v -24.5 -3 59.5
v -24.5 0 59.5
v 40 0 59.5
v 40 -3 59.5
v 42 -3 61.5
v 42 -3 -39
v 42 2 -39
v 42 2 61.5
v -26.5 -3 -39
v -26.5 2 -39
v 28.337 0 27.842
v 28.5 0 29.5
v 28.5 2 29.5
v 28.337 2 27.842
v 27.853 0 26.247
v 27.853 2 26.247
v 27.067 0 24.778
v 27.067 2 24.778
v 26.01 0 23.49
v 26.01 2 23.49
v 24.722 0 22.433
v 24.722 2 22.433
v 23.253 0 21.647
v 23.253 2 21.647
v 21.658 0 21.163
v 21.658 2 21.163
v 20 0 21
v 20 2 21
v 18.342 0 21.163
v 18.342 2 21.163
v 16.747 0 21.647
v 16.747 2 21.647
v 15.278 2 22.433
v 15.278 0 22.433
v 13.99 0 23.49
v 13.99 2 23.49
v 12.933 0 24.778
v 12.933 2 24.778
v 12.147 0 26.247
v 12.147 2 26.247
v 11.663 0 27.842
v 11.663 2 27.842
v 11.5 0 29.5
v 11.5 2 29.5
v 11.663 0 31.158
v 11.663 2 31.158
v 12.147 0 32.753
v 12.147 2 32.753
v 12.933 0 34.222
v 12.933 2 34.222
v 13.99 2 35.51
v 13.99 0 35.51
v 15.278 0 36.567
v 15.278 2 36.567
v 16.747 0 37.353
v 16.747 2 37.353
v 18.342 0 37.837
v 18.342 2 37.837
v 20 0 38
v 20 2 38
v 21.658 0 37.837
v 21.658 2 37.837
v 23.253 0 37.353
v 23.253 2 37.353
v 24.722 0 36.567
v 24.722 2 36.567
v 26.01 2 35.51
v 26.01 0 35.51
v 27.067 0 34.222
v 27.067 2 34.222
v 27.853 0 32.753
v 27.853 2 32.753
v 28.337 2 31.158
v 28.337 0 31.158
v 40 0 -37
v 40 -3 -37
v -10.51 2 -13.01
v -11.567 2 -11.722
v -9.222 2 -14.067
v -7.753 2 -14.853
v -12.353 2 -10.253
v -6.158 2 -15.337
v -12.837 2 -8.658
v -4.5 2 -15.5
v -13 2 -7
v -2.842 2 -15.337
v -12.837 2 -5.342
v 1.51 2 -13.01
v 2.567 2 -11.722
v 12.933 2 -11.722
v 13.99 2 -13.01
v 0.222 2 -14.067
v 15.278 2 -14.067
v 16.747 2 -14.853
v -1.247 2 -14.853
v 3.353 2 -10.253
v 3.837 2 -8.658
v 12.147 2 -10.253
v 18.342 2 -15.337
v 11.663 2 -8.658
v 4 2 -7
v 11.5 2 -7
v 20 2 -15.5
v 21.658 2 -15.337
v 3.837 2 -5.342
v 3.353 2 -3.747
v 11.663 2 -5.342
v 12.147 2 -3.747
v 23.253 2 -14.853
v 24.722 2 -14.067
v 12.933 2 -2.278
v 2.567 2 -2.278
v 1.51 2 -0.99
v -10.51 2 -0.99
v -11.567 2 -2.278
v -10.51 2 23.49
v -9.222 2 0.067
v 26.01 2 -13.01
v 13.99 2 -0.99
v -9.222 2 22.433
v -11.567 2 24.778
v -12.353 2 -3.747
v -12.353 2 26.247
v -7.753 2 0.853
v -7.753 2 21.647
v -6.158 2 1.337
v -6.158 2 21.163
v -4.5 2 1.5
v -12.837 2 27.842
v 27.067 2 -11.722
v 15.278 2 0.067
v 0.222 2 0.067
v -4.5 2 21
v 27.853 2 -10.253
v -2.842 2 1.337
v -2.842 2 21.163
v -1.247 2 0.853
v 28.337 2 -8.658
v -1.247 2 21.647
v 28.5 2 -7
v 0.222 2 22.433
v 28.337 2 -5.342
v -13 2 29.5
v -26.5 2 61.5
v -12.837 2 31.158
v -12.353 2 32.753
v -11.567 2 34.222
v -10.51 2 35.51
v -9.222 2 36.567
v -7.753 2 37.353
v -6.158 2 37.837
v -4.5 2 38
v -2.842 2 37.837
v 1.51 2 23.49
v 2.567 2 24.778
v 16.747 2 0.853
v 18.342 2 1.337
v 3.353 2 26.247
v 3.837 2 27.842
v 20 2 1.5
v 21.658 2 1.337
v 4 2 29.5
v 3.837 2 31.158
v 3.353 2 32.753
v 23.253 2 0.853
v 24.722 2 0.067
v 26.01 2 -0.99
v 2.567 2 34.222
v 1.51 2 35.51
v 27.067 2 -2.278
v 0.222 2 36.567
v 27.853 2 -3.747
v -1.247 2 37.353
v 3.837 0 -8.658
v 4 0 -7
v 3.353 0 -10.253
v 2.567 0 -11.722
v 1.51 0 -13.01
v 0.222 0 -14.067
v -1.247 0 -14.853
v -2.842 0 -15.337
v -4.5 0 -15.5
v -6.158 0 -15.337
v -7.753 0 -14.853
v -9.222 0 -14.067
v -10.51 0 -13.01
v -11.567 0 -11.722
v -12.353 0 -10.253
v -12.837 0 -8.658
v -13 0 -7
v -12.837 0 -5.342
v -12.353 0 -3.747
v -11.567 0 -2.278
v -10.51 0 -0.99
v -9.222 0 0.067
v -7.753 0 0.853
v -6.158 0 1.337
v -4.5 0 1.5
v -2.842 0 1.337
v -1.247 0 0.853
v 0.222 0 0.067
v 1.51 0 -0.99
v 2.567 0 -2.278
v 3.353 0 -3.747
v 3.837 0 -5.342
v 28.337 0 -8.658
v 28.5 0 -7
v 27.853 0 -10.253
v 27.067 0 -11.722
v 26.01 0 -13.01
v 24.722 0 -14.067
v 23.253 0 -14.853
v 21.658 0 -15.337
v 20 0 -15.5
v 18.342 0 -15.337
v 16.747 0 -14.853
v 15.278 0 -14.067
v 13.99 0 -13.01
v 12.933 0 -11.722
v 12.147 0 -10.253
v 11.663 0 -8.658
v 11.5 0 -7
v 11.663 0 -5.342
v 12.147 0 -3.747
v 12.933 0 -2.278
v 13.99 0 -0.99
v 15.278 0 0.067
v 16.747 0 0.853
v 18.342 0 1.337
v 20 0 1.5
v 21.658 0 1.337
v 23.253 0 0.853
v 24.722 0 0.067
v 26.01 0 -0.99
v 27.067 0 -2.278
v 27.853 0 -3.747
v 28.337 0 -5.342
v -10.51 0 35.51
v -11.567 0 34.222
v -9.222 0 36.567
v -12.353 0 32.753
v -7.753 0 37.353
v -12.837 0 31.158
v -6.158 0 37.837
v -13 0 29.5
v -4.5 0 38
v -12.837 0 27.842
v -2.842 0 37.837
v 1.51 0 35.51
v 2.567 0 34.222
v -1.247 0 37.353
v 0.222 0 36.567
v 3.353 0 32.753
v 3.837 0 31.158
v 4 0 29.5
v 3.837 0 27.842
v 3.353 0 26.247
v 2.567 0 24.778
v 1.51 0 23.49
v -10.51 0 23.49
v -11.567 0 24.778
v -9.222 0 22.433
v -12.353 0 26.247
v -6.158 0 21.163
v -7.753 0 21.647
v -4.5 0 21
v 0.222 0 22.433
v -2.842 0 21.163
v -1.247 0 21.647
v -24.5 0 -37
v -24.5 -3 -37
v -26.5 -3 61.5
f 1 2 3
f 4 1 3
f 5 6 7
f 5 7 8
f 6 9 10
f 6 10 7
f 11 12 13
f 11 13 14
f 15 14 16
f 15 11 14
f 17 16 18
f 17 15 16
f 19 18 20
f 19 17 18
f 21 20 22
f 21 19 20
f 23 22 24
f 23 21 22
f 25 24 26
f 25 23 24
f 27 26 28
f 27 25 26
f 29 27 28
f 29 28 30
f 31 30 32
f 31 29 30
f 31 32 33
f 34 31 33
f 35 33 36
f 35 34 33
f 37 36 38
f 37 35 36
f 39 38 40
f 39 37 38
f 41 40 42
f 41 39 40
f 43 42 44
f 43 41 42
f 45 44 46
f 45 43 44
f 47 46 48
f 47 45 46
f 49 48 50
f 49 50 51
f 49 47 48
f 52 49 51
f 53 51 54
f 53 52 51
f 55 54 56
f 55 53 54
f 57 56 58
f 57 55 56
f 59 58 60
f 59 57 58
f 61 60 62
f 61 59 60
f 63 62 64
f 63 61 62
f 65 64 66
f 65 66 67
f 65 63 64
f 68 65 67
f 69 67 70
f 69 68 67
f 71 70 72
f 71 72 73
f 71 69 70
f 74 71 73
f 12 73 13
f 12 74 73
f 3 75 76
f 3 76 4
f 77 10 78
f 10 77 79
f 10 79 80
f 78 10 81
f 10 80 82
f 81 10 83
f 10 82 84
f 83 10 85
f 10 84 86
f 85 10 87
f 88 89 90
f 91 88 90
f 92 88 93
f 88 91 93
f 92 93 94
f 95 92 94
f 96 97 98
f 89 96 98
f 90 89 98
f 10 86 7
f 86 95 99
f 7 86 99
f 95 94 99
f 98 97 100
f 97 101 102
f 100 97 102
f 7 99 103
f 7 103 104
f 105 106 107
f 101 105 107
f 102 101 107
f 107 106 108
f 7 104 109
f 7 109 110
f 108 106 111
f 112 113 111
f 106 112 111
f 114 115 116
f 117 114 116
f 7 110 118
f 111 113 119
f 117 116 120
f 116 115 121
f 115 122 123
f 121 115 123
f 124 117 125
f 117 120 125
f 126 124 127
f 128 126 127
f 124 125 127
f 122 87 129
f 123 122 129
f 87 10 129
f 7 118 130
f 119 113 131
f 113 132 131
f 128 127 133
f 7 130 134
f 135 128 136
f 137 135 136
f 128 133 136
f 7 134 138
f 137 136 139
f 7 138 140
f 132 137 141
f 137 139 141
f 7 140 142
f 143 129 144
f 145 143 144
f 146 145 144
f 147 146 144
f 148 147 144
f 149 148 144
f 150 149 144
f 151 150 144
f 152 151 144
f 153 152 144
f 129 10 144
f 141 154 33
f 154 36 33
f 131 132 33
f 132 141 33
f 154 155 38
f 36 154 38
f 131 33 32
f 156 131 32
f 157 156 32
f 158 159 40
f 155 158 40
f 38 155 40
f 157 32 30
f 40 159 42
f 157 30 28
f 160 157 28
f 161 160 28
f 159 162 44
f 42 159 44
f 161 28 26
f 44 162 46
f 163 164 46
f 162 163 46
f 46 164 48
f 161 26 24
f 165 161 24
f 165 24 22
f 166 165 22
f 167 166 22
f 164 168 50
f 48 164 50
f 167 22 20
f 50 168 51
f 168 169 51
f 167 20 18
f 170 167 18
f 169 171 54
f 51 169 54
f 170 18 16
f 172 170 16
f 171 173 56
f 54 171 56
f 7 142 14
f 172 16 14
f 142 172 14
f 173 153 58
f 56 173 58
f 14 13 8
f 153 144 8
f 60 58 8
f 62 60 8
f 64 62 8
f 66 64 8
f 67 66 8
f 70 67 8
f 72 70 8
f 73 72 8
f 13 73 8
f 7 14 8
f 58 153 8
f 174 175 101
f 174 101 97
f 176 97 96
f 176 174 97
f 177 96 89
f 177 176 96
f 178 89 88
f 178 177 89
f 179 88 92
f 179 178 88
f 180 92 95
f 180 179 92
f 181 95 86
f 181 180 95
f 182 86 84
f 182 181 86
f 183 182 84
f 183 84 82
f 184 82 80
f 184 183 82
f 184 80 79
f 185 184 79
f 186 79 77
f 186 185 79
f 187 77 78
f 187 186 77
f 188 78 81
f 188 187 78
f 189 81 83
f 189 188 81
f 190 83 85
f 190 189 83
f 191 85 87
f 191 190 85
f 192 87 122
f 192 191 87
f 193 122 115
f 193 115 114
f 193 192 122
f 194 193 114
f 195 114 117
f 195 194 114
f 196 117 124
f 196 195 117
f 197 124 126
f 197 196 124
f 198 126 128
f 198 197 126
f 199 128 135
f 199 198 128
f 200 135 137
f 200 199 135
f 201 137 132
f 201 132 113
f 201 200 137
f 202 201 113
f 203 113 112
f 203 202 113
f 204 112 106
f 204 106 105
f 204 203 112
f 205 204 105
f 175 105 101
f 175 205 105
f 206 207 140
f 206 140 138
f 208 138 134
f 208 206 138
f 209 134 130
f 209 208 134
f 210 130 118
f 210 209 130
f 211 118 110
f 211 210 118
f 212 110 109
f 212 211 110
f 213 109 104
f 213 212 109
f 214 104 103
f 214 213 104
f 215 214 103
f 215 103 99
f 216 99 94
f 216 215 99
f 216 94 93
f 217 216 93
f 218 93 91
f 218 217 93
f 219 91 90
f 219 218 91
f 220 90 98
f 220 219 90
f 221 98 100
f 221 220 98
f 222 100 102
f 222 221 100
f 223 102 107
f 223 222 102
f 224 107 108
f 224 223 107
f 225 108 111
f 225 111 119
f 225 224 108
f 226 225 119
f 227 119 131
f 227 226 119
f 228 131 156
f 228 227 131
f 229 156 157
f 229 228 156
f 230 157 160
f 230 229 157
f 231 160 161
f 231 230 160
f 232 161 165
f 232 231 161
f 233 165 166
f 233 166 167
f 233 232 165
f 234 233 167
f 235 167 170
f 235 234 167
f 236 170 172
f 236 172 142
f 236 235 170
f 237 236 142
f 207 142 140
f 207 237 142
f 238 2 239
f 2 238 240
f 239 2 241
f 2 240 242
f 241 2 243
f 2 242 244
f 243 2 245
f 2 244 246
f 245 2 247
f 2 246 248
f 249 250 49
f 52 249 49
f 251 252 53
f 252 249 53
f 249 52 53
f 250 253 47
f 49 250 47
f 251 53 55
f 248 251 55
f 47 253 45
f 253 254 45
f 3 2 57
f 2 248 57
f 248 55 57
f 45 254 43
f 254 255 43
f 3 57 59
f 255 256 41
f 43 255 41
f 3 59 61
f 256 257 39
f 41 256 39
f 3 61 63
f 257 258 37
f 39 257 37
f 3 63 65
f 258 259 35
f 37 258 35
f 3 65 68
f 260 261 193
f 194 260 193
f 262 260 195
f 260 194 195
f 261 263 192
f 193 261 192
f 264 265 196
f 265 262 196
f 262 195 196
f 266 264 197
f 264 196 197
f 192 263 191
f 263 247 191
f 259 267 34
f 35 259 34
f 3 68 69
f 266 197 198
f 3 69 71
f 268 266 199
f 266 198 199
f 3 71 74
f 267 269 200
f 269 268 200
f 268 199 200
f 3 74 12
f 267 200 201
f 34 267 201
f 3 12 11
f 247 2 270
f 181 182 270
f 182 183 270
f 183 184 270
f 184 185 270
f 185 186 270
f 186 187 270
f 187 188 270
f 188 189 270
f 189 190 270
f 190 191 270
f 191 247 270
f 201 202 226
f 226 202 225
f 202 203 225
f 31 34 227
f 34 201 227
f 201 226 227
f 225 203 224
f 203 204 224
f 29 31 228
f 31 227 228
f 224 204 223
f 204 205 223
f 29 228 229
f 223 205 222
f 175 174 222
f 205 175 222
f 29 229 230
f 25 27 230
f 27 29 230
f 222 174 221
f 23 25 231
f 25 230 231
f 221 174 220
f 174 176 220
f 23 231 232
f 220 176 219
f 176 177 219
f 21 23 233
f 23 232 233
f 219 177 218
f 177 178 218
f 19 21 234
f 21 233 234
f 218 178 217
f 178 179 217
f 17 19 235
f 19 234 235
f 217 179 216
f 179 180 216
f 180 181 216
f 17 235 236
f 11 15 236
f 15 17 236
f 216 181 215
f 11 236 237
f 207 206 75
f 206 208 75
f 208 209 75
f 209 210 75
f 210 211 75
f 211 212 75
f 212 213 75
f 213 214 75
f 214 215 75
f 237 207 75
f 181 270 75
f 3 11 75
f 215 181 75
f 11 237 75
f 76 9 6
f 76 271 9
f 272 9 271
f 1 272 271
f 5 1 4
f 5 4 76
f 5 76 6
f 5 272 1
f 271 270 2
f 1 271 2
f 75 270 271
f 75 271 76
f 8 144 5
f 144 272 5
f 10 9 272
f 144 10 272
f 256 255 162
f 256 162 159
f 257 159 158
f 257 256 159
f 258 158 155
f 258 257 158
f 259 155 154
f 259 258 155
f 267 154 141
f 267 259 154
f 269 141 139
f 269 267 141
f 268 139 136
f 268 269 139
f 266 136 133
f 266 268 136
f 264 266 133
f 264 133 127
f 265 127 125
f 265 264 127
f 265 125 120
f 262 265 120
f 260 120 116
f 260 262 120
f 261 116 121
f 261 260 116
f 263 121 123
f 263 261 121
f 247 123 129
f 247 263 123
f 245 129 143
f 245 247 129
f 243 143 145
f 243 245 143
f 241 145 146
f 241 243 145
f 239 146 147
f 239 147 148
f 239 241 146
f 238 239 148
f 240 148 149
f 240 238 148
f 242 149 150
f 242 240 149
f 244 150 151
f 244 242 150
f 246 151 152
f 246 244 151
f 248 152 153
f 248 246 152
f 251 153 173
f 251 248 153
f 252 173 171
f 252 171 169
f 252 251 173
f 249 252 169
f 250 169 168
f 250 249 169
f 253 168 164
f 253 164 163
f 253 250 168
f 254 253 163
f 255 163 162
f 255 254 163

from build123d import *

# Parameters (mm, degrees)
CROQUIS1_W                   = 64.5
CROQUIS1_H                   = 96.5
CROQUIS1_R                   = 8.5
SALIENTE_EXTRUIR4_DEPTH      = 2
CROQUIS2_W                   = 68.5
CROQUIS2_H                   = 100.5
CROQUIS2_W_2                 = 64.5
CROQUIS2_H_2                 = 96.5
SALIENTE_EXTRUIR5_DEPTH      = 3
SALIENTE_EXTRUIR5_DEPTH_BACK = 2


with BuildPart() as part:
    # Croquis1 → Saliente-Extruir4 (new body)
    with BuildSketch(Plane(origin=(0, 0, 0), x_dir=(1, 0, 0), z_dir=(0, 1, 0))):
        with Locations((7.75, -11.25)):
            Rectangle(CROQUIS1_W, CROQUIS1_H)
        with Locations((20, -29.5)):
            Circle(CROQUIS1_R, mode=Mode.SUBTRACT)
        with Locations((-4.5, -29.5)):
            Circle(CROQUIS1_R, mode=Mode.SUBTRACT)
        with Locations((-4.5, 7)):
            Circle(CROQUIS1_R, mode=Mode.SUBTRACT)
        with Locations((20, 7)):
            Circle(CROQUIS1_R, mode=Mode.SUBTRACT)
    extrude(amount=SALIENTE_EXTRUIR4_DEPTH)

    # Croquis2 → Saliente-Extruir5 (add, two sides)
    with BuildSketch(Plane.XZ) as saliente_extruir5_sk:
        with Locations((7.75, 11.25)):
            Rectangle(CROQUIS2_W, CROQUIS2_H)
        with Locations((7.75, 11.25)):
            Rectangle(CROQUIS2_W_2, CROQUIS2_H_2, mode=Mode.SUBTRACT)
    extrude(amount=SALIENTE_EXTRUIR5_DEPTH)
    extrude(saliente_extruir5_sk.sketch, amount=-SALIENTE_EXTRUIR5_DEPTH_BACK)


solid = part.part
